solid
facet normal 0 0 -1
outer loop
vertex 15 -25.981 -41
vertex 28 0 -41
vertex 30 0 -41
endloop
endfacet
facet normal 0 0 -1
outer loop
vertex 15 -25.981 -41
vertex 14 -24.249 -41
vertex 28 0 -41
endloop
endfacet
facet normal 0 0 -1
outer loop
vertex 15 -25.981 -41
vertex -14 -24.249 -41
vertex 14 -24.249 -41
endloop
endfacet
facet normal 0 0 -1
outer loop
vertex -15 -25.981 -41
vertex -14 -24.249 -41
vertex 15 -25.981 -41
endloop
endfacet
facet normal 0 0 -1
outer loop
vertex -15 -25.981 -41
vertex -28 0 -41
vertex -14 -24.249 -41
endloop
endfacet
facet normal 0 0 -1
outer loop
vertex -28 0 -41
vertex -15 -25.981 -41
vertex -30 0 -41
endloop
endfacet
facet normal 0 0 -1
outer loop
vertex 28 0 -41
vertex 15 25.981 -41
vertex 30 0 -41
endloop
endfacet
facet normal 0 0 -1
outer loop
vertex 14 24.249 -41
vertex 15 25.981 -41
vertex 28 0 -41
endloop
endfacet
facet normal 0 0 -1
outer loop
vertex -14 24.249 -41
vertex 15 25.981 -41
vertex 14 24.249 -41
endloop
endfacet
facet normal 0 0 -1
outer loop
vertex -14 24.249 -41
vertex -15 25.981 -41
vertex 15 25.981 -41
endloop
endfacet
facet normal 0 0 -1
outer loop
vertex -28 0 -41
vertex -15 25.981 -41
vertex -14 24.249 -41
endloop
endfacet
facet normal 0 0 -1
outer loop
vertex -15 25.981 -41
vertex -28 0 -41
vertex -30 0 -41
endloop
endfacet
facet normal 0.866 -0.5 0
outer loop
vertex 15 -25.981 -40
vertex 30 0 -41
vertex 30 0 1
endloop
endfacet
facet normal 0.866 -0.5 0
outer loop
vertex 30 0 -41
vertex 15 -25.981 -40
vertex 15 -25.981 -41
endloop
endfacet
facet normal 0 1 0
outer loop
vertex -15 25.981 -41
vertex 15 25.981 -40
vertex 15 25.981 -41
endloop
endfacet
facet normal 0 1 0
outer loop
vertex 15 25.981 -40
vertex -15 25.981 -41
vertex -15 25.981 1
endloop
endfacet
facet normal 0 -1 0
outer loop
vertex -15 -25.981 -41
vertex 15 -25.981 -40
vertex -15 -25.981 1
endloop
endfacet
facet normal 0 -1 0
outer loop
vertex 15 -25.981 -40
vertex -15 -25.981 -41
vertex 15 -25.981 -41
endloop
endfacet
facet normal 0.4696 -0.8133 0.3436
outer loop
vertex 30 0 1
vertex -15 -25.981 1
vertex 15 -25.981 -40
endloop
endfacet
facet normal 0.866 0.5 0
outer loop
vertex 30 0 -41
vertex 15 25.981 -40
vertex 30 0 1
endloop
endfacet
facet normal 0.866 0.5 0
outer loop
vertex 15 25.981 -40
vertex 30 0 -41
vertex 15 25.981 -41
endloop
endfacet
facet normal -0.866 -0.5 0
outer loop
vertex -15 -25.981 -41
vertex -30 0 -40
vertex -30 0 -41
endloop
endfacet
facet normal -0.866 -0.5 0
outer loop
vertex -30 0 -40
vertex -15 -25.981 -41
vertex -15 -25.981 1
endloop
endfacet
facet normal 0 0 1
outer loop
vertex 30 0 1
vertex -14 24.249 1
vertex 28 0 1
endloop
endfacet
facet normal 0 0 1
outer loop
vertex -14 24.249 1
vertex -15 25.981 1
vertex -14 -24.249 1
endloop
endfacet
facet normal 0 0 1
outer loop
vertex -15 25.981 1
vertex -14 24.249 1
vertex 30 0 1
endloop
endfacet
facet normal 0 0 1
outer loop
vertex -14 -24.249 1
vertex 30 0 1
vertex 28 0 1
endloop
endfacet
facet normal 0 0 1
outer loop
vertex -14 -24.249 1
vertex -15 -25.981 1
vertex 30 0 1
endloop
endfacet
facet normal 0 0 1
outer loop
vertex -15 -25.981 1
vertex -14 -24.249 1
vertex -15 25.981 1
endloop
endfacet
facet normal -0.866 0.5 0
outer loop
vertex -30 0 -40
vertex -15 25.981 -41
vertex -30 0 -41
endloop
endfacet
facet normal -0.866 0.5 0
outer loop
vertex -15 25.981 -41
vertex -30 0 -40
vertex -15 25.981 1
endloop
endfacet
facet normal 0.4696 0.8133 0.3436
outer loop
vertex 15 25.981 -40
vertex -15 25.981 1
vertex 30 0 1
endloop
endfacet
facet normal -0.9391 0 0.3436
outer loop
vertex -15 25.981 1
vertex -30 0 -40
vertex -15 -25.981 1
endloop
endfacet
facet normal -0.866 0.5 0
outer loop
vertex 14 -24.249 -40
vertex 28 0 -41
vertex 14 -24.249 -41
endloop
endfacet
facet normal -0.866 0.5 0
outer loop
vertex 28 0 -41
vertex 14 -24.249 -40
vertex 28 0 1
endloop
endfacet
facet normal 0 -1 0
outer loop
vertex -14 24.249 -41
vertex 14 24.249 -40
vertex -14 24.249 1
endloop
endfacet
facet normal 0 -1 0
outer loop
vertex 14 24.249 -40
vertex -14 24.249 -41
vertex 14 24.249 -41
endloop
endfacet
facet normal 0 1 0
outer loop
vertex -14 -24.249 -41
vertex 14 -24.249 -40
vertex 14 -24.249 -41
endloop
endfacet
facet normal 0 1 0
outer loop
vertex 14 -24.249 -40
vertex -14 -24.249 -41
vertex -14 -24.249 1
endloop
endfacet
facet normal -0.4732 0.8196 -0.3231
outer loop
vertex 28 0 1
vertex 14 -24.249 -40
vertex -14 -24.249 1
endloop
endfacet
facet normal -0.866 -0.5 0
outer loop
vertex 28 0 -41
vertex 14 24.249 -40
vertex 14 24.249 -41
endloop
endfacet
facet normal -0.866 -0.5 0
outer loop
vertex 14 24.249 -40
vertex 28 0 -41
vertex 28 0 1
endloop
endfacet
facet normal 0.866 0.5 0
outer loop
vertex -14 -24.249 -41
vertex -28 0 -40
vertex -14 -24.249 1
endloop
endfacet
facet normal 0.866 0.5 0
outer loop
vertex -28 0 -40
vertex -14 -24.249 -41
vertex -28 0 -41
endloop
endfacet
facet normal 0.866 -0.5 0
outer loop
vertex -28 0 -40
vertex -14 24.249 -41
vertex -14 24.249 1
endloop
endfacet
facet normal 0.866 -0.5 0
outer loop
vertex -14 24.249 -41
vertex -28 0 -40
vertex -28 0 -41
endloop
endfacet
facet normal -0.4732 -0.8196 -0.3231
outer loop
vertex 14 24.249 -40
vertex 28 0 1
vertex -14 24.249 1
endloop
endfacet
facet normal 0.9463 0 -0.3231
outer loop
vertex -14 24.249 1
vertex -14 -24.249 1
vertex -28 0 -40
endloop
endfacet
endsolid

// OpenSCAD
firstShape = 3; //side count first shape
fsSide=30; //Radius of first shape

secondShape = 6; //side count second shape
ssSide = 30; //Radius of second shape

wallWidth = 2; //thickness of walls
distanceApart = 40; // distance between shapes 
shapeHeight = 1; // How thick to make each shape before it starts to morph

//{
//rocketMan();
//}

//module rocketMan(){
	
	difference(){

		hull(){
		linear_extrude(height=shapeHeight,convexity=10) circle(r=fsSide, $fn=firstShape, center=true);
		#translate([0,0,-(distanceApart+shapeHeight)]) linear_extrude(height=shapeHeight,convexity=10) circle(r=ssSide, $fn=secondShape,center=true);

		}
		hull(){
		linear_extrude(height=shapeHeight,convexity=10) circle(r=fsSide-wallWidth, $fn=firstShape, center=true);
		translate([0,0,-(distanceApart+shapeHeight)]) linear_extrude(height=shapeHeight,convexity=10) circle(r=ssSide-wallWidth, $fn=secondShape,center=true);

		}
		


	}
//}
